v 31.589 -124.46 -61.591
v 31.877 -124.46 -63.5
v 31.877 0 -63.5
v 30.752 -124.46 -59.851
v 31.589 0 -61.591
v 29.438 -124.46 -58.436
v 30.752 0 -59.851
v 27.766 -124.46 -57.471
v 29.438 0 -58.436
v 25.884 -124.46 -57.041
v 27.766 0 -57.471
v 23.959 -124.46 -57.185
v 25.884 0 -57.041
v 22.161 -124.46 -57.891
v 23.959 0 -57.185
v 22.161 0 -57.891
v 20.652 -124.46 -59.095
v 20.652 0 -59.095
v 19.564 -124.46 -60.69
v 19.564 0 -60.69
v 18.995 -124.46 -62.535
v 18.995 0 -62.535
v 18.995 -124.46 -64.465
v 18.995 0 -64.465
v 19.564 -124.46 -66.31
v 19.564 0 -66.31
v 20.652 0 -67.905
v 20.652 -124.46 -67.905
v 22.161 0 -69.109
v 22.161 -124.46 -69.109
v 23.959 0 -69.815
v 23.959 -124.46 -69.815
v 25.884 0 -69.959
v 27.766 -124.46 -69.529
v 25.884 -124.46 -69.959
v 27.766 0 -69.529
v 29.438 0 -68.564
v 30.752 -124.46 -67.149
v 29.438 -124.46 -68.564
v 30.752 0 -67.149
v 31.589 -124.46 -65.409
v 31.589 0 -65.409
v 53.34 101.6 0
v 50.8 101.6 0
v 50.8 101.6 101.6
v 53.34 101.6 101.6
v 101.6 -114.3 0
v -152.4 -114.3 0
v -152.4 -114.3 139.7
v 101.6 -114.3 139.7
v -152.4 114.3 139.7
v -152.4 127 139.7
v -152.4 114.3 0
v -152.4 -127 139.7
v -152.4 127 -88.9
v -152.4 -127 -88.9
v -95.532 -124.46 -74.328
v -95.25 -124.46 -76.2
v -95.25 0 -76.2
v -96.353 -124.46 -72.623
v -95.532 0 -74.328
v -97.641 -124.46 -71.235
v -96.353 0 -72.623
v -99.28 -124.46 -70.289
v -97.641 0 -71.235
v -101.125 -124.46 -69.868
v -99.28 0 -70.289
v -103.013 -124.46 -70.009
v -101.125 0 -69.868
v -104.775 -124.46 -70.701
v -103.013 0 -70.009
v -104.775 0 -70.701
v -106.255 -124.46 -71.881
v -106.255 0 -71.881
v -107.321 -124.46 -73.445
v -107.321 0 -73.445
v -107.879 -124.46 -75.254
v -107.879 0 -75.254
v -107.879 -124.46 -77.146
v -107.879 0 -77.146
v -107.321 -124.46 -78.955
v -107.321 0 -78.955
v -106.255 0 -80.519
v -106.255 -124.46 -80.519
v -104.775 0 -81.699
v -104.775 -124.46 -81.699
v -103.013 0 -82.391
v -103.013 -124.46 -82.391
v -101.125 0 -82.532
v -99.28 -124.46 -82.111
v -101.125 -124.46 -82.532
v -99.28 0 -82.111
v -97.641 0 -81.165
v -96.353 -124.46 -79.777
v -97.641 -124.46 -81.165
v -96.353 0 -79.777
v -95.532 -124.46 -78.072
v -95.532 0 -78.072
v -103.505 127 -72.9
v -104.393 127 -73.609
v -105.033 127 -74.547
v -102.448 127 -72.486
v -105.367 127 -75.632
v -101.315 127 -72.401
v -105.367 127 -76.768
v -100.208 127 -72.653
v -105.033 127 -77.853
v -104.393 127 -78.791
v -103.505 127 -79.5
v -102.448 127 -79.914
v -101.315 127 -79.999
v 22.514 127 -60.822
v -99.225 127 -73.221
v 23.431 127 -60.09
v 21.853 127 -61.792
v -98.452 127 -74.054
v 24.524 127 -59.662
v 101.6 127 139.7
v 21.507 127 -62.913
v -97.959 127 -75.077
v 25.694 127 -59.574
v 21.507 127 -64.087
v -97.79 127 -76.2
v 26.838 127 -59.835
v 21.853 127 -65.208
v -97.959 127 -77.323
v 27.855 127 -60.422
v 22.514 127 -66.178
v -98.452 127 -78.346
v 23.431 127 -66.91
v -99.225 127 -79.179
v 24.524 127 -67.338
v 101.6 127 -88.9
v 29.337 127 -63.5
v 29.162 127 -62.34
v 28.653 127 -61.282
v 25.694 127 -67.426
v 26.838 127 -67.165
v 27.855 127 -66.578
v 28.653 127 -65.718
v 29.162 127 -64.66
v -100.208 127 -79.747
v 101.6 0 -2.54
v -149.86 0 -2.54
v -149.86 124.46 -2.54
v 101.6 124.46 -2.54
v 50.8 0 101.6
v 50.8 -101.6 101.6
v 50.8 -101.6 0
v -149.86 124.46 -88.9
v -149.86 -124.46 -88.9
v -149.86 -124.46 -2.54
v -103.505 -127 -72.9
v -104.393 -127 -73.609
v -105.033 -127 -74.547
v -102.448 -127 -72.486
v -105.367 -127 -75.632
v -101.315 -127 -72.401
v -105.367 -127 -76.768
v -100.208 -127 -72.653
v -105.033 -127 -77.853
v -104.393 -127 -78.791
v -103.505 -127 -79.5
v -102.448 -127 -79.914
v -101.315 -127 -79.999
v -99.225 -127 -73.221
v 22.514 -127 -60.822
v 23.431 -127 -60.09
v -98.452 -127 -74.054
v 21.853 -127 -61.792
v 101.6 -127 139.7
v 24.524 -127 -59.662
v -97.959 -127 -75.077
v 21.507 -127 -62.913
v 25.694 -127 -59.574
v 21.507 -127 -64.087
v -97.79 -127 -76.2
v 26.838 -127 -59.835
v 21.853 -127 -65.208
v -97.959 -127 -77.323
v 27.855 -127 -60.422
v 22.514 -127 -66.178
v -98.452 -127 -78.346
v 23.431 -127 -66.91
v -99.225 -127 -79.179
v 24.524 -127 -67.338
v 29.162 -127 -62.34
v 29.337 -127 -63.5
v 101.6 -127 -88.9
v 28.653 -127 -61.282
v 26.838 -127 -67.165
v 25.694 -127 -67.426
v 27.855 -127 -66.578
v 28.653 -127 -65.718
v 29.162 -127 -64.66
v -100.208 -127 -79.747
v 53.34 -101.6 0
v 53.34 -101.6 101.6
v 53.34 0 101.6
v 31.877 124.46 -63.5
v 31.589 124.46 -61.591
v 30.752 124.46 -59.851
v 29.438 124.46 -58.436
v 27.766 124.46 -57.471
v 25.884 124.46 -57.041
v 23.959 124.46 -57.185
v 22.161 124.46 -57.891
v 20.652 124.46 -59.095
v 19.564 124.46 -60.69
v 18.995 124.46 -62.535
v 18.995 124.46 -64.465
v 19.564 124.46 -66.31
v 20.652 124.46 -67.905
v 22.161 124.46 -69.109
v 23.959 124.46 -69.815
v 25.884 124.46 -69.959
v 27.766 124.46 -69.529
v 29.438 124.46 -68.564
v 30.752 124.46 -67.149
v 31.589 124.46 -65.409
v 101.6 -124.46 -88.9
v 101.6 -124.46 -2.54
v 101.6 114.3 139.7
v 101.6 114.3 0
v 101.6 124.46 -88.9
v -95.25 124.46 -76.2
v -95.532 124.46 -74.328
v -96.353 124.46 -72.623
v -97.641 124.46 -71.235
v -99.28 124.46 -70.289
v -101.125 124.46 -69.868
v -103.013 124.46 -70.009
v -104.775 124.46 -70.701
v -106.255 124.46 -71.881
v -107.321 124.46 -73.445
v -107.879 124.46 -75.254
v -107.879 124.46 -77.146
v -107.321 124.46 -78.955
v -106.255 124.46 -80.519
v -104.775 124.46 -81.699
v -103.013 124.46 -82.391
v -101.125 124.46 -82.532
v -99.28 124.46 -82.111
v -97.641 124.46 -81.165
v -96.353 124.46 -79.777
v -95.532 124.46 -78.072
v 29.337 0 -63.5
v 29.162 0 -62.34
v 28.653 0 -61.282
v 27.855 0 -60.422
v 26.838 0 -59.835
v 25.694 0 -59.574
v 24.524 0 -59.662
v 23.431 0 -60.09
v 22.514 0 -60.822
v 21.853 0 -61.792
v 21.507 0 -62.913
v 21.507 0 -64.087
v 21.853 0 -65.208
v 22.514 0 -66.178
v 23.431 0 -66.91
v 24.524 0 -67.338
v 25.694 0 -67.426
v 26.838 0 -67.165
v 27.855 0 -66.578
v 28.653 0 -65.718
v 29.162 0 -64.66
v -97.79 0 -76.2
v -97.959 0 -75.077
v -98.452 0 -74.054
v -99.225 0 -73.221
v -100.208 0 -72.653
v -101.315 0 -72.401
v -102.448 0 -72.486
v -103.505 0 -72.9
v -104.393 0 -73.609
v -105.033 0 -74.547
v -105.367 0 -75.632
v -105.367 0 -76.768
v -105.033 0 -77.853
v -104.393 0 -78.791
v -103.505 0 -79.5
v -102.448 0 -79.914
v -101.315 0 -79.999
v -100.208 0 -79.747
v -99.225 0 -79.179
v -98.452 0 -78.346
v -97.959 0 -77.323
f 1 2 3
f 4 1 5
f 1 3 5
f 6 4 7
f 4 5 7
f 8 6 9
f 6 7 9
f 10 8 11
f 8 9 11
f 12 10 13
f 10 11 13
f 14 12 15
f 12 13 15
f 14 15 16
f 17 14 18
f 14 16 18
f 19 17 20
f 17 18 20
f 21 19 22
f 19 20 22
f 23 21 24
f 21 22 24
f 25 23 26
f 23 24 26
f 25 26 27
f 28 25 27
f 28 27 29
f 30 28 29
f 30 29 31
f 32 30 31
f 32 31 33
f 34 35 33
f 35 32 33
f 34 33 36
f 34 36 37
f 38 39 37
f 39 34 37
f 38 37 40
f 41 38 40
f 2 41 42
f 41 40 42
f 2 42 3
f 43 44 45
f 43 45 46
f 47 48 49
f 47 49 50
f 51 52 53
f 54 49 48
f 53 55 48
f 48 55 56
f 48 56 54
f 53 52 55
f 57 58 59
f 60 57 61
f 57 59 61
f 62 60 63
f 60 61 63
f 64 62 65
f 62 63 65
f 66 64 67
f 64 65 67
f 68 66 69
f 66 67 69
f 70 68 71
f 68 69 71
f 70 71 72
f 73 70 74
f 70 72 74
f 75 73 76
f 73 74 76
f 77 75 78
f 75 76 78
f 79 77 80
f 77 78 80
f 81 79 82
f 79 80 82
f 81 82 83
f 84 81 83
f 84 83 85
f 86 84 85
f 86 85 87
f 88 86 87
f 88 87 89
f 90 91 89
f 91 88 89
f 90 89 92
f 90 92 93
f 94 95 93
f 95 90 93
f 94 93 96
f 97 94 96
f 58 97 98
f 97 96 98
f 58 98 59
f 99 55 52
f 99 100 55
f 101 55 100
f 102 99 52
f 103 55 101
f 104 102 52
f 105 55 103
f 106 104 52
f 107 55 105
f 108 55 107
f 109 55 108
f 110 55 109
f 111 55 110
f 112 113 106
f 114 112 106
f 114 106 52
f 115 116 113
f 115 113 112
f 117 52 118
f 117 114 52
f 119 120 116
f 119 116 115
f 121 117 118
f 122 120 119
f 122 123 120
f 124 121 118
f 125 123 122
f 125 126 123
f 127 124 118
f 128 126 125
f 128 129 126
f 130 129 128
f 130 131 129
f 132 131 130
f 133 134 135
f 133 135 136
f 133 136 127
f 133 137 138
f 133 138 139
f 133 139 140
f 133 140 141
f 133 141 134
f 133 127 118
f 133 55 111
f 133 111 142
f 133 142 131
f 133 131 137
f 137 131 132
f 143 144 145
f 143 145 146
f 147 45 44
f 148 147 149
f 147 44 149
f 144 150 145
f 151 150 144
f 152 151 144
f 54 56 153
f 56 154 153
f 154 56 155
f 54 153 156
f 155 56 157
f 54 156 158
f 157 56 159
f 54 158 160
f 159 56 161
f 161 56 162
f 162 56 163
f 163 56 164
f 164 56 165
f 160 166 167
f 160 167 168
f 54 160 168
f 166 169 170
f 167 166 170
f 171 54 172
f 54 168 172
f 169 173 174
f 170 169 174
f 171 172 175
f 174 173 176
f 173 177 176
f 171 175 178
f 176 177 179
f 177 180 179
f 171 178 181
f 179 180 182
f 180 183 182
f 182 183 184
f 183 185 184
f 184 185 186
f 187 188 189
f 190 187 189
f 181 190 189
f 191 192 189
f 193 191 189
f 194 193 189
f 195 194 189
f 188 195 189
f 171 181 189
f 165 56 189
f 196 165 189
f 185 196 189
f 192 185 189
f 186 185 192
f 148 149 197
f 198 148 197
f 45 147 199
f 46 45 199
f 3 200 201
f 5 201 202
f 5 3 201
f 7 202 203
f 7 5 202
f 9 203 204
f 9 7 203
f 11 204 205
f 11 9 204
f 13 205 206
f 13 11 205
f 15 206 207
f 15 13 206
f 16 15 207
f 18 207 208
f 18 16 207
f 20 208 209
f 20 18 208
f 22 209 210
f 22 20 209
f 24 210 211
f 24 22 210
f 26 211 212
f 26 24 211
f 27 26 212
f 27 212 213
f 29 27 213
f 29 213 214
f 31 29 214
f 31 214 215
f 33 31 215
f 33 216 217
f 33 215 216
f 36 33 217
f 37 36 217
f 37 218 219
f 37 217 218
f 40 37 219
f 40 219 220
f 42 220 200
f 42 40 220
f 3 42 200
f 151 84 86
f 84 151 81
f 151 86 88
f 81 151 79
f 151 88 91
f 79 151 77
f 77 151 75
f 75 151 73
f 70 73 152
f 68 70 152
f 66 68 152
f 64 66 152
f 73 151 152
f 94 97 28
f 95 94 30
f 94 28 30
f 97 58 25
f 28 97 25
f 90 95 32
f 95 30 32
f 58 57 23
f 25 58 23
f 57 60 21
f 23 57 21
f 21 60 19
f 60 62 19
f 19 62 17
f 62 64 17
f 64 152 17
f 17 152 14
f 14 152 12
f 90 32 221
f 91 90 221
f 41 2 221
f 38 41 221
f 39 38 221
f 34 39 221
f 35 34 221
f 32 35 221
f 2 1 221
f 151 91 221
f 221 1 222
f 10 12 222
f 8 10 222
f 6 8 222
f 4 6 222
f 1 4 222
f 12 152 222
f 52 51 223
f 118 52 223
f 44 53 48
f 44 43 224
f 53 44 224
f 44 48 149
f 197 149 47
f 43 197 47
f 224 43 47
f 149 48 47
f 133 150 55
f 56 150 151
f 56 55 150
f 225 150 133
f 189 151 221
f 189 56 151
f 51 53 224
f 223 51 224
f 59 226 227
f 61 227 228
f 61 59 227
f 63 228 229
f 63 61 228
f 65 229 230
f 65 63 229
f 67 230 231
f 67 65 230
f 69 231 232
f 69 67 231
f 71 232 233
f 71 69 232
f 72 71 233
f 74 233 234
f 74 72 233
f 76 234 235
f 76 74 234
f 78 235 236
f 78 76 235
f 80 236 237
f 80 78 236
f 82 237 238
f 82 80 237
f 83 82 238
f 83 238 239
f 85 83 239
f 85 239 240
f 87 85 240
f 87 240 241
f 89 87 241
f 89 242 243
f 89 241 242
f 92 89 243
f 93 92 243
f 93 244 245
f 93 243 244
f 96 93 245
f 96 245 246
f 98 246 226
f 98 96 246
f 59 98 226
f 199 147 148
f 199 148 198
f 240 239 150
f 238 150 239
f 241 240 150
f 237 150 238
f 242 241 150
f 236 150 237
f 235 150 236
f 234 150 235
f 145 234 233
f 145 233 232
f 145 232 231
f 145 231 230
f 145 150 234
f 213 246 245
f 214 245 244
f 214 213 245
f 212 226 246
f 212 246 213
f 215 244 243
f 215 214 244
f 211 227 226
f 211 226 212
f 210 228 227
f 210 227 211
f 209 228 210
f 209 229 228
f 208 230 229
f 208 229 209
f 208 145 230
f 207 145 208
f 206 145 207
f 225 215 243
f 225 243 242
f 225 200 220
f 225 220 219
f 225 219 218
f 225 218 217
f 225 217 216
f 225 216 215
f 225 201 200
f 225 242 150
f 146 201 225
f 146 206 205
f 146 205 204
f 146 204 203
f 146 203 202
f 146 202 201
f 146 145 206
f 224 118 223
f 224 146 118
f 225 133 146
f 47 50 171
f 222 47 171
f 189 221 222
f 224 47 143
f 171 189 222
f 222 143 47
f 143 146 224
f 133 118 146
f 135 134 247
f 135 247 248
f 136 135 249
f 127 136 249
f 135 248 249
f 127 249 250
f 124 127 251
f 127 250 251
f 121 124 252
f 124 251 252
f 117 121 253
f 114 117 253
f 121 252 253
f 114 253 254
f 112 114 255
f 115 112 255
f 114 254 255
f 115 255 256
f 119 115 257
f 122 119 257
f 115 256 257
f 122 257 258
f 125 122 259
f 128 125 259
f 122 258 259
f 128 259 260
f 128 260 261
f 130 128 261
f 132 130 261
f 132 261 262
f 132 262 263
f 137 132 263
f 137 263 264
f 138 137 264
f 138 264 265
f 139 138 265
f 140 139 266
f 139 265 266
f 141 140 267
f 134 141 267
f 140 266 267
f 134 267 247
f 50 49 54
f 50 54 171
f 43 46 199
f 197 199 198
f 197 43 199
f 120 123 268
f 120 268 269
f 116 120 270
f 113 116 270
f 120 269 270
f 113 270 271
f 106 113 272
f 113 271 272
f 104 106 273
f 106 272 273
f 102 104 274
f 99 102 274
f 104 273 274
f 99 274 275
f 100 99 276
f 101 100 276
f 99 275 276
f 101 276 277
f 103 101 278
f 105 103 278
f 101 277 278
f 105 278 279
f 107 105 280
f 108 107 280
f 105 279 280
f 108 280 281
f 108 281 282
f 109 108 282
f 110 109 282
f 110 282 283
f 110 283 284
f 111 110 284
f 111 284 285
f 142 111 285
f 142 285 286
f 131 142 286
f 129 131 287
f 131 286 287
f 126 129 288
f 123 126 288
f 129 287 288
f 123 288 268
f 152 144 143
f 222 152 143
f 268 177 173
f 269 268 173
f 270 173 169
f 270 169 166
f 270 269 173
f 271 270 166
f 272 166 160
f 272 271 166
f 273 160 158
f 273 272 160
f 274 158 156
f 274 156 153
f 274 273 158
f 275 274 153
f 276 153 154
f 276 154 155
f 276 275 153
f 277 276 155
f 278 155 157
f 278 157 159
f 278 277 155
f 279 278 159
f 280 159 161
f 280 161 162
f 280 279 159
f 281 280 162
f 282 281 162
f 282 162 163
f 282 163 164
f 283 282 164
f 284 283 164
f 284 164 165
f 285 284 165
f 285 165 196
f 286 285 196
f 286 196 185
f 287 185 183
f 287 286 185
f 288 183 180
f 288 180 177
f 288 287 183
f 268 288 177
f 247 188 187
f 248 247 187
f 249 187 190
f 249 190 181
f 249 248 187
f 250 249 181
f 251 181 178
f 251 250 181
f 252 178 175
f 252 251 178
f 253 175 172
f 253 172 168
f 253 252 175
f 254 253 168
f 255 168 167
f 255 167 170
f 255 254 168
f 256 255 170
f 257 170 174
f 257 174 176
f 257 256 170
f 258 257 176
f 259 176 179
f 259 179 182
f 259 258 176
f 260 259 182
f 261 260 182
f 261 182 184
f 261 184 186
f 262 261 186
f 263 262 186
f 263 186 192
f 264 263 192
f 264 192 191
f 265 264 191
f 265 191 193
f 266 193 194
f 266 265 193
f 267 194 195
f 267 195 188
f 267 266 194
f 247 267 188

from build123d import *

# Parameters (mm, degrees)
F0_W     = 254
F0_H     = 88.9
F0_R     = 3.81
F0_R_2   = 3.937
F1_DEPTH = 127
F2_T     = -2.54
F3_W     = 2.54
F3_H     = 101.6
F4_DEPTH = 101.6
F5_W     = 254
F5_H     = 12.7
F6_DEPTH = 139.7


with BuildPart() as f1:
    # F0 (on Front) → F1 (new body)
    with BuildSketch(Plane.XZ):
        with Locations((-25.4, -44.45)):
            Rectangle(F0_W, F0_H)
        with Locations((-101.6, -76.2)):
            Circle(F0_R, mode=Mode.SUBTRACT)
        with Locations((25.4, -63.5)):
            Circle(F0_R_2, mode=Mode.SUBTRACT)
    extrude(amount=F1_DEPTH)

    # F2
    f2_openings = [f1.faces().sort_by_distance(p)[0] for p in [
        (-25.35547, 0, -44.344356),
        (-25.4, -63.5, -88.9),
        (101.6, -63.5, -44.45),
    ]]
    offset(amount=F2_T, openings=f2_openings)

    # F3 (on face) → F4 (join)
    with BuildSketch(Plane.XY):
        with Locations((52.07, -50.8)):
            Rectangle(F3_W, F3_H)
    extrude(amount=F4_DEPTH)

    # F5 (on face) → F6 (join)
    with BuildSketch(Plane.XY):
        with Locations((-25.4, -120.65)):
            Rectangle(F5_W, F5_H)
    extrude(amount=F6_DEPTH)

    # F7: F1 across plane


with BuildPart() as f1_1:
    add(f1.part)
    add(f1.part.mirror(Plane.XZ))


solid = f1_1.part
